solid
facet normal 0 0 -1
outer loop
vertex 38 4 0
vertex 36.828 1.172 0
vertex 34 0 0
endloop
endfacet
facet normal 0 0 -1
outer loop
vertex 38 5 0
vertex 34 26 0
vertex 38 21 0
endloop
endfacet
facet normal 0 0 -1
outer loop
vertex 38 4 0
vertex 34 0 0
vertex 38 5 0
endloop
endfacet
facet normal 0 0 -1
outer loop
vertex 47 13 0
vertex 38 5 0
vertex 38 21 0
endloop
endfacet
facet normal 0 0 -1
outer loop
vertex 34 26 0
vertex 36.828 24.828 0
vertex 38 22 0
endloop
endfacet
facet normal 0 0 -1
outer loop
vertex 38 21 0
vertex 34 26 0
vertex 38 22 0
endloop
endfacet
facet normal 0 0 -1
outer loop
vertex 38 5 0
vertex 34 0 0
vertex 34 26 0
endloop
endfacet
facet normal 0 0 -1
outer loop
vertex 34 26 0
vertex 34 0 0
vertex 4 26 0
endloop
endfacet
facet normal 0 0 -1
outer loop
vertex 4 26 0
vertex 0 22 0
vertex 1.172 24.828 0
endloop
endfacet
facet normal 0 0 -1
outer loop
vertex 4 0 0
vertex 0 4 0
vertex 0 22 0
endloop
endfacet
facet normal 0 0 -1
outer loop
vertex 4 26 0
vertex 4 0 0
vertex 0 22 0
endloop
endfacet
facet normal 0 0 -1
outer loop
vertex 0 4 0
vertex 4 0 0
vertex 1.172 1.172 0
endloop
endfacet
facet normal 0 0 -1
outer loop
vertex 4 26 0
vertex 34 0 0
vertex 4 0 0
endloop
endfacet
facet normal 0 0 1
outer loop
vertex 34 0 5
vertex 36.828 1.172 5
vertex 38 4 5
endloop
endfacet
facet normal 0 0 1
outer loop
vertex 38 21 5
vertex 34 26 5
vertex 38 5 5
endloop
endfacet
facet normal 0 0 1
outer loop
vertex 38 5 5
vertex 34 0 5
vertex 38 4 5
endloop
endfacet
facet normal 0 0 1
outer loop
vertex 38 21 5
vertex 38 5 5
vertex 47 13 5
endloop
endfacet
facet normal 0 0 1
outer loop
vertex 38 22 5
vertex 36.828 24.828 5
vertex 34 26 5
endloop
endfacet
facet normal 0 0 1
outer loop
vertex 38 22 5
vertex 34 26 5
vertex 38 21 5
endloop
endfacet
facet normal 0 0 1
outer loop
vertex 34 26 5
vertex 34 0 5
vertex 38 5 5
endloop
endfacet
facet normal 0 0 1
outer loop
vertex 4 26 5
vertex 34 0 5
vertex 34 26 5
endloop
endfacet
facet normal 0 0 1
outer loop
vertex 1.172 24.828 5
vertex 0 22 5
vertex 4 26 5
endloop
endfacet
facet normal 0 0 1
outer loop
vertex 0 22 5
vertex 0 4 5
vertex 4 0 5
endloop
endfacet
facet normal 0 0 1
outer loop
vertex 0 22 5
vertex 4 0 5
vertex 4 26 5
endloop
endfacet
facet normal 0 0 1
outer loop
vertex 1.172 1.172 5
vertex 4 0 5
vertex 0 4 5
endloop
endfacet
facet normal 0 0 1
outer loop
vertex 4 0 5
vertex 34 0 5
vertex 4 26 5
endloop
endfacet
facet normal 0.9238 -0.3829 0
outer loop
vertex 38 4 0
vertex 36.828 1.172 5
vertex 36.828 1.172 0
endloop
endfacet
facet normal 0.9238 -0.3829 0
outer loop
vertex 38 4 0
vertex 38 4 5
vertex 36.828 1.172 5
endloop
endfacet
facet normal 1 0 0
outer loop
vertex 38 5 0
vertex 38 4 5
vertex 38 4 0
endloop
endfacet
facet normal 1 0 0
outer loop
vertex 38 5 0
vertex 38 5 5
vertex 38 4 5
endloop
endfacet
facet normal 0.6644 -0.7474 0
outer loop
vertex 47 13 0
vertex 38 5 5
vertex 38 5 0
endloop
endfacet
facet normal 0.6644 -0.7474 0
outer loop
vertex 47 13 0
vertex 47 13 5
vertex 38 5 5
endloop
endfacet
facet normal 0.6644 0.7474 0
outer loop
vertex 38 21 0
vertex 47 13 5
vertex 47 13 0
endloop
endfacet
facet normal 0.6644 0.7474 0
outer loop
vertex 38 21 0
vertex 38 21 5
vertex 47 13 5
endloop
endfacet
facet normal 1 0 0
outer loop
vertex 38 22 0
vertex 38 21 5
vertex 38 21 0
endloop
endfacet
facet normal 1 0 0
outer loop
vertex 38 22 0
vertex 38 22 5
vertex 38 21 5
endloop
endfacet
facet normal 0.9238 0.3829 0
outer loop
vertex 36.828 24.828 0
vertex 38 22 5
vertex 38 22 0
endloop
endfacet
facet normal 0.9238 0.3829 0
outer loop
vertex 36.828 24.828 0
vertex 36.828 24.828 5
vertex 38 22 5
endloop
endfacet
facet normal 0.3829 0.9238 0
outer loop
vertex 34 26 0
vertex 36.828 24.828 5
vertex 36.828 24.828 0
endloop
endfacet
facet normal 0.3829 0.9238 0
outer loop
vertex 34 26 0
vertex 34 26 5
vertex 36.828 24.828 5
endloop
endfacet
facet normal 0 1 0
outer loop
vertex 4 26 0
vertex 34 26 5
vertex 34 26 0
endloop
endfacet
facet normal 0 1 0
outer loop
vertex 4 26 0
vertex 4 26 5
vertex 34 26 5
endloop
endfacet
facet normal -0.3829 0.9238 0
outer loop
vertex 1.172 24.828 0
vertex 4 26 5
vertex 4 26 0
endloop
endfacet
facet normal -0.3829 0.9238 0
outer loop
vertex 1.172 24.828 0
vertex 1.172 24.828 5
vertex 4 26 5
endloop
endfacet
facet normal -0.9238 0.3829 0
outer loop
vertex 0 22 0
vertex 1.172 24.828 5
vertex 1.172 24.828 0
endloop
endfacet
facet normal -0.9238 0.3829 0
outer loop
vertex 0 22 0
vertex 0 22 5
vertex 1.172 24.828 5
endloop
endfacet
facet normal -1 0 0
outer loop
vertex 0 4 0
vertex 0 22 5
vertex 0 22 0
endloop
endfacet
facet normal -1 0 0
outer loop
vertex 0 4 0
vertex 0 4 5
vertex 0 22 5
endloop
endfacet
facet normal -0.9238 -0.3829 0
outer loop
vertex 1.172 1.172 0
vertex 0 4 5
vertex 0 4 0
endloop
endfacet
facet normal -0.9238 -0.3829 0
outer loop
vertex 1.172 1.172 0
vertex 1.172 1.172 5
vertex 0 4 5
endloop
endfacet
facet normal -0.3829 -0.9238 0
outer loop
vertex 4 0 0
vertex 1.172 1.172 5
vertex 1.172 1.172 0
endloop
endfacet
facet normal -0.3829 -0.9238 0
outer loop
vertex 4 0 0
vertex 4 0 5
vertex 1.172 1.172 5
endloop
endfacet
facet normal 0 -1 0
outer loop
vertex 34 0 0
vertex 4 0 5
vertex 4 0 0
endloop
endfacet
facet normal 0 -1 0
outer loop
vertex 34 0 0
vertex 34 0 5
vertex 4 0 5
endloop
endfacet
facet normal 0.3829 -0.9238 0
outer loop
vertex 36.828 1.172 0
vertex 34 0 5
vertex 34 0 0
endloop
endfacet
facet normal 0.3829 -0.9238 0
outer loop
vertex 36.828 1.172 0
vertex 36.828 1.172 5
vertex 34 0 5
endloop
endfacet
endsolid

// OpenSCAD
$fn = 32;

// ----------------------------------------------------------------------
// Ratchet pawl: 38 x 26 mm body, beak 9 mm с правого торца
// ----------------------------------------------------------------------

// --- parameters (mm) ---
profile_height = 5;       // extrusion height
profile_points = 15;      // points of the closed outline

profile = [[0, 4], [1.172, 1.172], [4, 0], [34, 0], [36.828, 1.172], [38, 4], [38, 5], [47, 13], [38, 21], [38, 22], [36.828, 24.828], [34, 26], [4, 26], [1.172, 24.828], [0, 22]];  // single closed polygon, 15 points, counter clockwise

// --- the one profile operation ---
linear_extrude(height = profile_height) polygon(points = profile);
